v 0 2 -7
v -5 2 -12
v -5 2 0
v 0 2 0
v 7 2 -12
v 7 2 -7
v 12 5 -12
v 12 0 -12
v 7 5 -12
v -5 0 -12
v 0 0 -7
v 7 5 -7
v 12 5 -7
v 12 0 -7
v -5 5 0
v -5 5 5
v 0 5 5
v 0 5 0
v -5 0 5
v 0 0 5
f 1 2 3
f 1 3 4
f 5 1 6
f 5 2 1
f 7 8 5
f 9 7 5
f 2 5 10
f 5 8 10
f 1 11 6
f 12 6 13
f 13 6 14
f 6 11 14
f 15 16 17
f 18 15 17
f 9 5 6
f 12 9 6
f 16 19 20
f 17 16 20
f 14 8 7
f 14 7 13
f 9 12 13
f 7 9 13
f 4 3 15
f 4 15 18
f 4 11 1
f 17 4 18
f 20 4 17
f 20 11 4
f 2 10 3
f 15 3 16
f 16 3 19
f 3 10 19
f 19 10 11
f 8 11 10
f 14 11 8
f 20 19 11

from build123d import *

# Parameters (mm, degrees)
BOSS_EXTRUDE1_DEPTH = 2
SKETCH2_W           = 5
SKETCH2_H           = 5
BOSS_EXTRUDE2_DEPTH = 5


with BuildPart() as part:
    # Sketch1 → Boss-Extrude1 (new body)
    with BuildSketch(Plane(origin=(0, 0, 0), x_dir=(1, 0, 0), z_dir=(0, 1, 0))):
        Polygon((0, 0), (0, 7), (7, 7), (7, 12), (-5, 12), (-5, 0), align=None)
    extrude(amount=BOSS_EXTRUDE1_DEPTH)

    # Sketch2 → Boss-Extrude2 (add)
    with BuildSketch(Plane.XZ):
        with Locations((-2.5, 2.5)):
            Rectangle(SKETCH2_W, SKETCH2_H)
        with Locations((9.5, -9.5)):
            Rectangle(SKETCH2_W, SKETCH2_H)
    extrude(amount=-BOSS_EXTRUDE2_DEPTH)


solid = part.part
